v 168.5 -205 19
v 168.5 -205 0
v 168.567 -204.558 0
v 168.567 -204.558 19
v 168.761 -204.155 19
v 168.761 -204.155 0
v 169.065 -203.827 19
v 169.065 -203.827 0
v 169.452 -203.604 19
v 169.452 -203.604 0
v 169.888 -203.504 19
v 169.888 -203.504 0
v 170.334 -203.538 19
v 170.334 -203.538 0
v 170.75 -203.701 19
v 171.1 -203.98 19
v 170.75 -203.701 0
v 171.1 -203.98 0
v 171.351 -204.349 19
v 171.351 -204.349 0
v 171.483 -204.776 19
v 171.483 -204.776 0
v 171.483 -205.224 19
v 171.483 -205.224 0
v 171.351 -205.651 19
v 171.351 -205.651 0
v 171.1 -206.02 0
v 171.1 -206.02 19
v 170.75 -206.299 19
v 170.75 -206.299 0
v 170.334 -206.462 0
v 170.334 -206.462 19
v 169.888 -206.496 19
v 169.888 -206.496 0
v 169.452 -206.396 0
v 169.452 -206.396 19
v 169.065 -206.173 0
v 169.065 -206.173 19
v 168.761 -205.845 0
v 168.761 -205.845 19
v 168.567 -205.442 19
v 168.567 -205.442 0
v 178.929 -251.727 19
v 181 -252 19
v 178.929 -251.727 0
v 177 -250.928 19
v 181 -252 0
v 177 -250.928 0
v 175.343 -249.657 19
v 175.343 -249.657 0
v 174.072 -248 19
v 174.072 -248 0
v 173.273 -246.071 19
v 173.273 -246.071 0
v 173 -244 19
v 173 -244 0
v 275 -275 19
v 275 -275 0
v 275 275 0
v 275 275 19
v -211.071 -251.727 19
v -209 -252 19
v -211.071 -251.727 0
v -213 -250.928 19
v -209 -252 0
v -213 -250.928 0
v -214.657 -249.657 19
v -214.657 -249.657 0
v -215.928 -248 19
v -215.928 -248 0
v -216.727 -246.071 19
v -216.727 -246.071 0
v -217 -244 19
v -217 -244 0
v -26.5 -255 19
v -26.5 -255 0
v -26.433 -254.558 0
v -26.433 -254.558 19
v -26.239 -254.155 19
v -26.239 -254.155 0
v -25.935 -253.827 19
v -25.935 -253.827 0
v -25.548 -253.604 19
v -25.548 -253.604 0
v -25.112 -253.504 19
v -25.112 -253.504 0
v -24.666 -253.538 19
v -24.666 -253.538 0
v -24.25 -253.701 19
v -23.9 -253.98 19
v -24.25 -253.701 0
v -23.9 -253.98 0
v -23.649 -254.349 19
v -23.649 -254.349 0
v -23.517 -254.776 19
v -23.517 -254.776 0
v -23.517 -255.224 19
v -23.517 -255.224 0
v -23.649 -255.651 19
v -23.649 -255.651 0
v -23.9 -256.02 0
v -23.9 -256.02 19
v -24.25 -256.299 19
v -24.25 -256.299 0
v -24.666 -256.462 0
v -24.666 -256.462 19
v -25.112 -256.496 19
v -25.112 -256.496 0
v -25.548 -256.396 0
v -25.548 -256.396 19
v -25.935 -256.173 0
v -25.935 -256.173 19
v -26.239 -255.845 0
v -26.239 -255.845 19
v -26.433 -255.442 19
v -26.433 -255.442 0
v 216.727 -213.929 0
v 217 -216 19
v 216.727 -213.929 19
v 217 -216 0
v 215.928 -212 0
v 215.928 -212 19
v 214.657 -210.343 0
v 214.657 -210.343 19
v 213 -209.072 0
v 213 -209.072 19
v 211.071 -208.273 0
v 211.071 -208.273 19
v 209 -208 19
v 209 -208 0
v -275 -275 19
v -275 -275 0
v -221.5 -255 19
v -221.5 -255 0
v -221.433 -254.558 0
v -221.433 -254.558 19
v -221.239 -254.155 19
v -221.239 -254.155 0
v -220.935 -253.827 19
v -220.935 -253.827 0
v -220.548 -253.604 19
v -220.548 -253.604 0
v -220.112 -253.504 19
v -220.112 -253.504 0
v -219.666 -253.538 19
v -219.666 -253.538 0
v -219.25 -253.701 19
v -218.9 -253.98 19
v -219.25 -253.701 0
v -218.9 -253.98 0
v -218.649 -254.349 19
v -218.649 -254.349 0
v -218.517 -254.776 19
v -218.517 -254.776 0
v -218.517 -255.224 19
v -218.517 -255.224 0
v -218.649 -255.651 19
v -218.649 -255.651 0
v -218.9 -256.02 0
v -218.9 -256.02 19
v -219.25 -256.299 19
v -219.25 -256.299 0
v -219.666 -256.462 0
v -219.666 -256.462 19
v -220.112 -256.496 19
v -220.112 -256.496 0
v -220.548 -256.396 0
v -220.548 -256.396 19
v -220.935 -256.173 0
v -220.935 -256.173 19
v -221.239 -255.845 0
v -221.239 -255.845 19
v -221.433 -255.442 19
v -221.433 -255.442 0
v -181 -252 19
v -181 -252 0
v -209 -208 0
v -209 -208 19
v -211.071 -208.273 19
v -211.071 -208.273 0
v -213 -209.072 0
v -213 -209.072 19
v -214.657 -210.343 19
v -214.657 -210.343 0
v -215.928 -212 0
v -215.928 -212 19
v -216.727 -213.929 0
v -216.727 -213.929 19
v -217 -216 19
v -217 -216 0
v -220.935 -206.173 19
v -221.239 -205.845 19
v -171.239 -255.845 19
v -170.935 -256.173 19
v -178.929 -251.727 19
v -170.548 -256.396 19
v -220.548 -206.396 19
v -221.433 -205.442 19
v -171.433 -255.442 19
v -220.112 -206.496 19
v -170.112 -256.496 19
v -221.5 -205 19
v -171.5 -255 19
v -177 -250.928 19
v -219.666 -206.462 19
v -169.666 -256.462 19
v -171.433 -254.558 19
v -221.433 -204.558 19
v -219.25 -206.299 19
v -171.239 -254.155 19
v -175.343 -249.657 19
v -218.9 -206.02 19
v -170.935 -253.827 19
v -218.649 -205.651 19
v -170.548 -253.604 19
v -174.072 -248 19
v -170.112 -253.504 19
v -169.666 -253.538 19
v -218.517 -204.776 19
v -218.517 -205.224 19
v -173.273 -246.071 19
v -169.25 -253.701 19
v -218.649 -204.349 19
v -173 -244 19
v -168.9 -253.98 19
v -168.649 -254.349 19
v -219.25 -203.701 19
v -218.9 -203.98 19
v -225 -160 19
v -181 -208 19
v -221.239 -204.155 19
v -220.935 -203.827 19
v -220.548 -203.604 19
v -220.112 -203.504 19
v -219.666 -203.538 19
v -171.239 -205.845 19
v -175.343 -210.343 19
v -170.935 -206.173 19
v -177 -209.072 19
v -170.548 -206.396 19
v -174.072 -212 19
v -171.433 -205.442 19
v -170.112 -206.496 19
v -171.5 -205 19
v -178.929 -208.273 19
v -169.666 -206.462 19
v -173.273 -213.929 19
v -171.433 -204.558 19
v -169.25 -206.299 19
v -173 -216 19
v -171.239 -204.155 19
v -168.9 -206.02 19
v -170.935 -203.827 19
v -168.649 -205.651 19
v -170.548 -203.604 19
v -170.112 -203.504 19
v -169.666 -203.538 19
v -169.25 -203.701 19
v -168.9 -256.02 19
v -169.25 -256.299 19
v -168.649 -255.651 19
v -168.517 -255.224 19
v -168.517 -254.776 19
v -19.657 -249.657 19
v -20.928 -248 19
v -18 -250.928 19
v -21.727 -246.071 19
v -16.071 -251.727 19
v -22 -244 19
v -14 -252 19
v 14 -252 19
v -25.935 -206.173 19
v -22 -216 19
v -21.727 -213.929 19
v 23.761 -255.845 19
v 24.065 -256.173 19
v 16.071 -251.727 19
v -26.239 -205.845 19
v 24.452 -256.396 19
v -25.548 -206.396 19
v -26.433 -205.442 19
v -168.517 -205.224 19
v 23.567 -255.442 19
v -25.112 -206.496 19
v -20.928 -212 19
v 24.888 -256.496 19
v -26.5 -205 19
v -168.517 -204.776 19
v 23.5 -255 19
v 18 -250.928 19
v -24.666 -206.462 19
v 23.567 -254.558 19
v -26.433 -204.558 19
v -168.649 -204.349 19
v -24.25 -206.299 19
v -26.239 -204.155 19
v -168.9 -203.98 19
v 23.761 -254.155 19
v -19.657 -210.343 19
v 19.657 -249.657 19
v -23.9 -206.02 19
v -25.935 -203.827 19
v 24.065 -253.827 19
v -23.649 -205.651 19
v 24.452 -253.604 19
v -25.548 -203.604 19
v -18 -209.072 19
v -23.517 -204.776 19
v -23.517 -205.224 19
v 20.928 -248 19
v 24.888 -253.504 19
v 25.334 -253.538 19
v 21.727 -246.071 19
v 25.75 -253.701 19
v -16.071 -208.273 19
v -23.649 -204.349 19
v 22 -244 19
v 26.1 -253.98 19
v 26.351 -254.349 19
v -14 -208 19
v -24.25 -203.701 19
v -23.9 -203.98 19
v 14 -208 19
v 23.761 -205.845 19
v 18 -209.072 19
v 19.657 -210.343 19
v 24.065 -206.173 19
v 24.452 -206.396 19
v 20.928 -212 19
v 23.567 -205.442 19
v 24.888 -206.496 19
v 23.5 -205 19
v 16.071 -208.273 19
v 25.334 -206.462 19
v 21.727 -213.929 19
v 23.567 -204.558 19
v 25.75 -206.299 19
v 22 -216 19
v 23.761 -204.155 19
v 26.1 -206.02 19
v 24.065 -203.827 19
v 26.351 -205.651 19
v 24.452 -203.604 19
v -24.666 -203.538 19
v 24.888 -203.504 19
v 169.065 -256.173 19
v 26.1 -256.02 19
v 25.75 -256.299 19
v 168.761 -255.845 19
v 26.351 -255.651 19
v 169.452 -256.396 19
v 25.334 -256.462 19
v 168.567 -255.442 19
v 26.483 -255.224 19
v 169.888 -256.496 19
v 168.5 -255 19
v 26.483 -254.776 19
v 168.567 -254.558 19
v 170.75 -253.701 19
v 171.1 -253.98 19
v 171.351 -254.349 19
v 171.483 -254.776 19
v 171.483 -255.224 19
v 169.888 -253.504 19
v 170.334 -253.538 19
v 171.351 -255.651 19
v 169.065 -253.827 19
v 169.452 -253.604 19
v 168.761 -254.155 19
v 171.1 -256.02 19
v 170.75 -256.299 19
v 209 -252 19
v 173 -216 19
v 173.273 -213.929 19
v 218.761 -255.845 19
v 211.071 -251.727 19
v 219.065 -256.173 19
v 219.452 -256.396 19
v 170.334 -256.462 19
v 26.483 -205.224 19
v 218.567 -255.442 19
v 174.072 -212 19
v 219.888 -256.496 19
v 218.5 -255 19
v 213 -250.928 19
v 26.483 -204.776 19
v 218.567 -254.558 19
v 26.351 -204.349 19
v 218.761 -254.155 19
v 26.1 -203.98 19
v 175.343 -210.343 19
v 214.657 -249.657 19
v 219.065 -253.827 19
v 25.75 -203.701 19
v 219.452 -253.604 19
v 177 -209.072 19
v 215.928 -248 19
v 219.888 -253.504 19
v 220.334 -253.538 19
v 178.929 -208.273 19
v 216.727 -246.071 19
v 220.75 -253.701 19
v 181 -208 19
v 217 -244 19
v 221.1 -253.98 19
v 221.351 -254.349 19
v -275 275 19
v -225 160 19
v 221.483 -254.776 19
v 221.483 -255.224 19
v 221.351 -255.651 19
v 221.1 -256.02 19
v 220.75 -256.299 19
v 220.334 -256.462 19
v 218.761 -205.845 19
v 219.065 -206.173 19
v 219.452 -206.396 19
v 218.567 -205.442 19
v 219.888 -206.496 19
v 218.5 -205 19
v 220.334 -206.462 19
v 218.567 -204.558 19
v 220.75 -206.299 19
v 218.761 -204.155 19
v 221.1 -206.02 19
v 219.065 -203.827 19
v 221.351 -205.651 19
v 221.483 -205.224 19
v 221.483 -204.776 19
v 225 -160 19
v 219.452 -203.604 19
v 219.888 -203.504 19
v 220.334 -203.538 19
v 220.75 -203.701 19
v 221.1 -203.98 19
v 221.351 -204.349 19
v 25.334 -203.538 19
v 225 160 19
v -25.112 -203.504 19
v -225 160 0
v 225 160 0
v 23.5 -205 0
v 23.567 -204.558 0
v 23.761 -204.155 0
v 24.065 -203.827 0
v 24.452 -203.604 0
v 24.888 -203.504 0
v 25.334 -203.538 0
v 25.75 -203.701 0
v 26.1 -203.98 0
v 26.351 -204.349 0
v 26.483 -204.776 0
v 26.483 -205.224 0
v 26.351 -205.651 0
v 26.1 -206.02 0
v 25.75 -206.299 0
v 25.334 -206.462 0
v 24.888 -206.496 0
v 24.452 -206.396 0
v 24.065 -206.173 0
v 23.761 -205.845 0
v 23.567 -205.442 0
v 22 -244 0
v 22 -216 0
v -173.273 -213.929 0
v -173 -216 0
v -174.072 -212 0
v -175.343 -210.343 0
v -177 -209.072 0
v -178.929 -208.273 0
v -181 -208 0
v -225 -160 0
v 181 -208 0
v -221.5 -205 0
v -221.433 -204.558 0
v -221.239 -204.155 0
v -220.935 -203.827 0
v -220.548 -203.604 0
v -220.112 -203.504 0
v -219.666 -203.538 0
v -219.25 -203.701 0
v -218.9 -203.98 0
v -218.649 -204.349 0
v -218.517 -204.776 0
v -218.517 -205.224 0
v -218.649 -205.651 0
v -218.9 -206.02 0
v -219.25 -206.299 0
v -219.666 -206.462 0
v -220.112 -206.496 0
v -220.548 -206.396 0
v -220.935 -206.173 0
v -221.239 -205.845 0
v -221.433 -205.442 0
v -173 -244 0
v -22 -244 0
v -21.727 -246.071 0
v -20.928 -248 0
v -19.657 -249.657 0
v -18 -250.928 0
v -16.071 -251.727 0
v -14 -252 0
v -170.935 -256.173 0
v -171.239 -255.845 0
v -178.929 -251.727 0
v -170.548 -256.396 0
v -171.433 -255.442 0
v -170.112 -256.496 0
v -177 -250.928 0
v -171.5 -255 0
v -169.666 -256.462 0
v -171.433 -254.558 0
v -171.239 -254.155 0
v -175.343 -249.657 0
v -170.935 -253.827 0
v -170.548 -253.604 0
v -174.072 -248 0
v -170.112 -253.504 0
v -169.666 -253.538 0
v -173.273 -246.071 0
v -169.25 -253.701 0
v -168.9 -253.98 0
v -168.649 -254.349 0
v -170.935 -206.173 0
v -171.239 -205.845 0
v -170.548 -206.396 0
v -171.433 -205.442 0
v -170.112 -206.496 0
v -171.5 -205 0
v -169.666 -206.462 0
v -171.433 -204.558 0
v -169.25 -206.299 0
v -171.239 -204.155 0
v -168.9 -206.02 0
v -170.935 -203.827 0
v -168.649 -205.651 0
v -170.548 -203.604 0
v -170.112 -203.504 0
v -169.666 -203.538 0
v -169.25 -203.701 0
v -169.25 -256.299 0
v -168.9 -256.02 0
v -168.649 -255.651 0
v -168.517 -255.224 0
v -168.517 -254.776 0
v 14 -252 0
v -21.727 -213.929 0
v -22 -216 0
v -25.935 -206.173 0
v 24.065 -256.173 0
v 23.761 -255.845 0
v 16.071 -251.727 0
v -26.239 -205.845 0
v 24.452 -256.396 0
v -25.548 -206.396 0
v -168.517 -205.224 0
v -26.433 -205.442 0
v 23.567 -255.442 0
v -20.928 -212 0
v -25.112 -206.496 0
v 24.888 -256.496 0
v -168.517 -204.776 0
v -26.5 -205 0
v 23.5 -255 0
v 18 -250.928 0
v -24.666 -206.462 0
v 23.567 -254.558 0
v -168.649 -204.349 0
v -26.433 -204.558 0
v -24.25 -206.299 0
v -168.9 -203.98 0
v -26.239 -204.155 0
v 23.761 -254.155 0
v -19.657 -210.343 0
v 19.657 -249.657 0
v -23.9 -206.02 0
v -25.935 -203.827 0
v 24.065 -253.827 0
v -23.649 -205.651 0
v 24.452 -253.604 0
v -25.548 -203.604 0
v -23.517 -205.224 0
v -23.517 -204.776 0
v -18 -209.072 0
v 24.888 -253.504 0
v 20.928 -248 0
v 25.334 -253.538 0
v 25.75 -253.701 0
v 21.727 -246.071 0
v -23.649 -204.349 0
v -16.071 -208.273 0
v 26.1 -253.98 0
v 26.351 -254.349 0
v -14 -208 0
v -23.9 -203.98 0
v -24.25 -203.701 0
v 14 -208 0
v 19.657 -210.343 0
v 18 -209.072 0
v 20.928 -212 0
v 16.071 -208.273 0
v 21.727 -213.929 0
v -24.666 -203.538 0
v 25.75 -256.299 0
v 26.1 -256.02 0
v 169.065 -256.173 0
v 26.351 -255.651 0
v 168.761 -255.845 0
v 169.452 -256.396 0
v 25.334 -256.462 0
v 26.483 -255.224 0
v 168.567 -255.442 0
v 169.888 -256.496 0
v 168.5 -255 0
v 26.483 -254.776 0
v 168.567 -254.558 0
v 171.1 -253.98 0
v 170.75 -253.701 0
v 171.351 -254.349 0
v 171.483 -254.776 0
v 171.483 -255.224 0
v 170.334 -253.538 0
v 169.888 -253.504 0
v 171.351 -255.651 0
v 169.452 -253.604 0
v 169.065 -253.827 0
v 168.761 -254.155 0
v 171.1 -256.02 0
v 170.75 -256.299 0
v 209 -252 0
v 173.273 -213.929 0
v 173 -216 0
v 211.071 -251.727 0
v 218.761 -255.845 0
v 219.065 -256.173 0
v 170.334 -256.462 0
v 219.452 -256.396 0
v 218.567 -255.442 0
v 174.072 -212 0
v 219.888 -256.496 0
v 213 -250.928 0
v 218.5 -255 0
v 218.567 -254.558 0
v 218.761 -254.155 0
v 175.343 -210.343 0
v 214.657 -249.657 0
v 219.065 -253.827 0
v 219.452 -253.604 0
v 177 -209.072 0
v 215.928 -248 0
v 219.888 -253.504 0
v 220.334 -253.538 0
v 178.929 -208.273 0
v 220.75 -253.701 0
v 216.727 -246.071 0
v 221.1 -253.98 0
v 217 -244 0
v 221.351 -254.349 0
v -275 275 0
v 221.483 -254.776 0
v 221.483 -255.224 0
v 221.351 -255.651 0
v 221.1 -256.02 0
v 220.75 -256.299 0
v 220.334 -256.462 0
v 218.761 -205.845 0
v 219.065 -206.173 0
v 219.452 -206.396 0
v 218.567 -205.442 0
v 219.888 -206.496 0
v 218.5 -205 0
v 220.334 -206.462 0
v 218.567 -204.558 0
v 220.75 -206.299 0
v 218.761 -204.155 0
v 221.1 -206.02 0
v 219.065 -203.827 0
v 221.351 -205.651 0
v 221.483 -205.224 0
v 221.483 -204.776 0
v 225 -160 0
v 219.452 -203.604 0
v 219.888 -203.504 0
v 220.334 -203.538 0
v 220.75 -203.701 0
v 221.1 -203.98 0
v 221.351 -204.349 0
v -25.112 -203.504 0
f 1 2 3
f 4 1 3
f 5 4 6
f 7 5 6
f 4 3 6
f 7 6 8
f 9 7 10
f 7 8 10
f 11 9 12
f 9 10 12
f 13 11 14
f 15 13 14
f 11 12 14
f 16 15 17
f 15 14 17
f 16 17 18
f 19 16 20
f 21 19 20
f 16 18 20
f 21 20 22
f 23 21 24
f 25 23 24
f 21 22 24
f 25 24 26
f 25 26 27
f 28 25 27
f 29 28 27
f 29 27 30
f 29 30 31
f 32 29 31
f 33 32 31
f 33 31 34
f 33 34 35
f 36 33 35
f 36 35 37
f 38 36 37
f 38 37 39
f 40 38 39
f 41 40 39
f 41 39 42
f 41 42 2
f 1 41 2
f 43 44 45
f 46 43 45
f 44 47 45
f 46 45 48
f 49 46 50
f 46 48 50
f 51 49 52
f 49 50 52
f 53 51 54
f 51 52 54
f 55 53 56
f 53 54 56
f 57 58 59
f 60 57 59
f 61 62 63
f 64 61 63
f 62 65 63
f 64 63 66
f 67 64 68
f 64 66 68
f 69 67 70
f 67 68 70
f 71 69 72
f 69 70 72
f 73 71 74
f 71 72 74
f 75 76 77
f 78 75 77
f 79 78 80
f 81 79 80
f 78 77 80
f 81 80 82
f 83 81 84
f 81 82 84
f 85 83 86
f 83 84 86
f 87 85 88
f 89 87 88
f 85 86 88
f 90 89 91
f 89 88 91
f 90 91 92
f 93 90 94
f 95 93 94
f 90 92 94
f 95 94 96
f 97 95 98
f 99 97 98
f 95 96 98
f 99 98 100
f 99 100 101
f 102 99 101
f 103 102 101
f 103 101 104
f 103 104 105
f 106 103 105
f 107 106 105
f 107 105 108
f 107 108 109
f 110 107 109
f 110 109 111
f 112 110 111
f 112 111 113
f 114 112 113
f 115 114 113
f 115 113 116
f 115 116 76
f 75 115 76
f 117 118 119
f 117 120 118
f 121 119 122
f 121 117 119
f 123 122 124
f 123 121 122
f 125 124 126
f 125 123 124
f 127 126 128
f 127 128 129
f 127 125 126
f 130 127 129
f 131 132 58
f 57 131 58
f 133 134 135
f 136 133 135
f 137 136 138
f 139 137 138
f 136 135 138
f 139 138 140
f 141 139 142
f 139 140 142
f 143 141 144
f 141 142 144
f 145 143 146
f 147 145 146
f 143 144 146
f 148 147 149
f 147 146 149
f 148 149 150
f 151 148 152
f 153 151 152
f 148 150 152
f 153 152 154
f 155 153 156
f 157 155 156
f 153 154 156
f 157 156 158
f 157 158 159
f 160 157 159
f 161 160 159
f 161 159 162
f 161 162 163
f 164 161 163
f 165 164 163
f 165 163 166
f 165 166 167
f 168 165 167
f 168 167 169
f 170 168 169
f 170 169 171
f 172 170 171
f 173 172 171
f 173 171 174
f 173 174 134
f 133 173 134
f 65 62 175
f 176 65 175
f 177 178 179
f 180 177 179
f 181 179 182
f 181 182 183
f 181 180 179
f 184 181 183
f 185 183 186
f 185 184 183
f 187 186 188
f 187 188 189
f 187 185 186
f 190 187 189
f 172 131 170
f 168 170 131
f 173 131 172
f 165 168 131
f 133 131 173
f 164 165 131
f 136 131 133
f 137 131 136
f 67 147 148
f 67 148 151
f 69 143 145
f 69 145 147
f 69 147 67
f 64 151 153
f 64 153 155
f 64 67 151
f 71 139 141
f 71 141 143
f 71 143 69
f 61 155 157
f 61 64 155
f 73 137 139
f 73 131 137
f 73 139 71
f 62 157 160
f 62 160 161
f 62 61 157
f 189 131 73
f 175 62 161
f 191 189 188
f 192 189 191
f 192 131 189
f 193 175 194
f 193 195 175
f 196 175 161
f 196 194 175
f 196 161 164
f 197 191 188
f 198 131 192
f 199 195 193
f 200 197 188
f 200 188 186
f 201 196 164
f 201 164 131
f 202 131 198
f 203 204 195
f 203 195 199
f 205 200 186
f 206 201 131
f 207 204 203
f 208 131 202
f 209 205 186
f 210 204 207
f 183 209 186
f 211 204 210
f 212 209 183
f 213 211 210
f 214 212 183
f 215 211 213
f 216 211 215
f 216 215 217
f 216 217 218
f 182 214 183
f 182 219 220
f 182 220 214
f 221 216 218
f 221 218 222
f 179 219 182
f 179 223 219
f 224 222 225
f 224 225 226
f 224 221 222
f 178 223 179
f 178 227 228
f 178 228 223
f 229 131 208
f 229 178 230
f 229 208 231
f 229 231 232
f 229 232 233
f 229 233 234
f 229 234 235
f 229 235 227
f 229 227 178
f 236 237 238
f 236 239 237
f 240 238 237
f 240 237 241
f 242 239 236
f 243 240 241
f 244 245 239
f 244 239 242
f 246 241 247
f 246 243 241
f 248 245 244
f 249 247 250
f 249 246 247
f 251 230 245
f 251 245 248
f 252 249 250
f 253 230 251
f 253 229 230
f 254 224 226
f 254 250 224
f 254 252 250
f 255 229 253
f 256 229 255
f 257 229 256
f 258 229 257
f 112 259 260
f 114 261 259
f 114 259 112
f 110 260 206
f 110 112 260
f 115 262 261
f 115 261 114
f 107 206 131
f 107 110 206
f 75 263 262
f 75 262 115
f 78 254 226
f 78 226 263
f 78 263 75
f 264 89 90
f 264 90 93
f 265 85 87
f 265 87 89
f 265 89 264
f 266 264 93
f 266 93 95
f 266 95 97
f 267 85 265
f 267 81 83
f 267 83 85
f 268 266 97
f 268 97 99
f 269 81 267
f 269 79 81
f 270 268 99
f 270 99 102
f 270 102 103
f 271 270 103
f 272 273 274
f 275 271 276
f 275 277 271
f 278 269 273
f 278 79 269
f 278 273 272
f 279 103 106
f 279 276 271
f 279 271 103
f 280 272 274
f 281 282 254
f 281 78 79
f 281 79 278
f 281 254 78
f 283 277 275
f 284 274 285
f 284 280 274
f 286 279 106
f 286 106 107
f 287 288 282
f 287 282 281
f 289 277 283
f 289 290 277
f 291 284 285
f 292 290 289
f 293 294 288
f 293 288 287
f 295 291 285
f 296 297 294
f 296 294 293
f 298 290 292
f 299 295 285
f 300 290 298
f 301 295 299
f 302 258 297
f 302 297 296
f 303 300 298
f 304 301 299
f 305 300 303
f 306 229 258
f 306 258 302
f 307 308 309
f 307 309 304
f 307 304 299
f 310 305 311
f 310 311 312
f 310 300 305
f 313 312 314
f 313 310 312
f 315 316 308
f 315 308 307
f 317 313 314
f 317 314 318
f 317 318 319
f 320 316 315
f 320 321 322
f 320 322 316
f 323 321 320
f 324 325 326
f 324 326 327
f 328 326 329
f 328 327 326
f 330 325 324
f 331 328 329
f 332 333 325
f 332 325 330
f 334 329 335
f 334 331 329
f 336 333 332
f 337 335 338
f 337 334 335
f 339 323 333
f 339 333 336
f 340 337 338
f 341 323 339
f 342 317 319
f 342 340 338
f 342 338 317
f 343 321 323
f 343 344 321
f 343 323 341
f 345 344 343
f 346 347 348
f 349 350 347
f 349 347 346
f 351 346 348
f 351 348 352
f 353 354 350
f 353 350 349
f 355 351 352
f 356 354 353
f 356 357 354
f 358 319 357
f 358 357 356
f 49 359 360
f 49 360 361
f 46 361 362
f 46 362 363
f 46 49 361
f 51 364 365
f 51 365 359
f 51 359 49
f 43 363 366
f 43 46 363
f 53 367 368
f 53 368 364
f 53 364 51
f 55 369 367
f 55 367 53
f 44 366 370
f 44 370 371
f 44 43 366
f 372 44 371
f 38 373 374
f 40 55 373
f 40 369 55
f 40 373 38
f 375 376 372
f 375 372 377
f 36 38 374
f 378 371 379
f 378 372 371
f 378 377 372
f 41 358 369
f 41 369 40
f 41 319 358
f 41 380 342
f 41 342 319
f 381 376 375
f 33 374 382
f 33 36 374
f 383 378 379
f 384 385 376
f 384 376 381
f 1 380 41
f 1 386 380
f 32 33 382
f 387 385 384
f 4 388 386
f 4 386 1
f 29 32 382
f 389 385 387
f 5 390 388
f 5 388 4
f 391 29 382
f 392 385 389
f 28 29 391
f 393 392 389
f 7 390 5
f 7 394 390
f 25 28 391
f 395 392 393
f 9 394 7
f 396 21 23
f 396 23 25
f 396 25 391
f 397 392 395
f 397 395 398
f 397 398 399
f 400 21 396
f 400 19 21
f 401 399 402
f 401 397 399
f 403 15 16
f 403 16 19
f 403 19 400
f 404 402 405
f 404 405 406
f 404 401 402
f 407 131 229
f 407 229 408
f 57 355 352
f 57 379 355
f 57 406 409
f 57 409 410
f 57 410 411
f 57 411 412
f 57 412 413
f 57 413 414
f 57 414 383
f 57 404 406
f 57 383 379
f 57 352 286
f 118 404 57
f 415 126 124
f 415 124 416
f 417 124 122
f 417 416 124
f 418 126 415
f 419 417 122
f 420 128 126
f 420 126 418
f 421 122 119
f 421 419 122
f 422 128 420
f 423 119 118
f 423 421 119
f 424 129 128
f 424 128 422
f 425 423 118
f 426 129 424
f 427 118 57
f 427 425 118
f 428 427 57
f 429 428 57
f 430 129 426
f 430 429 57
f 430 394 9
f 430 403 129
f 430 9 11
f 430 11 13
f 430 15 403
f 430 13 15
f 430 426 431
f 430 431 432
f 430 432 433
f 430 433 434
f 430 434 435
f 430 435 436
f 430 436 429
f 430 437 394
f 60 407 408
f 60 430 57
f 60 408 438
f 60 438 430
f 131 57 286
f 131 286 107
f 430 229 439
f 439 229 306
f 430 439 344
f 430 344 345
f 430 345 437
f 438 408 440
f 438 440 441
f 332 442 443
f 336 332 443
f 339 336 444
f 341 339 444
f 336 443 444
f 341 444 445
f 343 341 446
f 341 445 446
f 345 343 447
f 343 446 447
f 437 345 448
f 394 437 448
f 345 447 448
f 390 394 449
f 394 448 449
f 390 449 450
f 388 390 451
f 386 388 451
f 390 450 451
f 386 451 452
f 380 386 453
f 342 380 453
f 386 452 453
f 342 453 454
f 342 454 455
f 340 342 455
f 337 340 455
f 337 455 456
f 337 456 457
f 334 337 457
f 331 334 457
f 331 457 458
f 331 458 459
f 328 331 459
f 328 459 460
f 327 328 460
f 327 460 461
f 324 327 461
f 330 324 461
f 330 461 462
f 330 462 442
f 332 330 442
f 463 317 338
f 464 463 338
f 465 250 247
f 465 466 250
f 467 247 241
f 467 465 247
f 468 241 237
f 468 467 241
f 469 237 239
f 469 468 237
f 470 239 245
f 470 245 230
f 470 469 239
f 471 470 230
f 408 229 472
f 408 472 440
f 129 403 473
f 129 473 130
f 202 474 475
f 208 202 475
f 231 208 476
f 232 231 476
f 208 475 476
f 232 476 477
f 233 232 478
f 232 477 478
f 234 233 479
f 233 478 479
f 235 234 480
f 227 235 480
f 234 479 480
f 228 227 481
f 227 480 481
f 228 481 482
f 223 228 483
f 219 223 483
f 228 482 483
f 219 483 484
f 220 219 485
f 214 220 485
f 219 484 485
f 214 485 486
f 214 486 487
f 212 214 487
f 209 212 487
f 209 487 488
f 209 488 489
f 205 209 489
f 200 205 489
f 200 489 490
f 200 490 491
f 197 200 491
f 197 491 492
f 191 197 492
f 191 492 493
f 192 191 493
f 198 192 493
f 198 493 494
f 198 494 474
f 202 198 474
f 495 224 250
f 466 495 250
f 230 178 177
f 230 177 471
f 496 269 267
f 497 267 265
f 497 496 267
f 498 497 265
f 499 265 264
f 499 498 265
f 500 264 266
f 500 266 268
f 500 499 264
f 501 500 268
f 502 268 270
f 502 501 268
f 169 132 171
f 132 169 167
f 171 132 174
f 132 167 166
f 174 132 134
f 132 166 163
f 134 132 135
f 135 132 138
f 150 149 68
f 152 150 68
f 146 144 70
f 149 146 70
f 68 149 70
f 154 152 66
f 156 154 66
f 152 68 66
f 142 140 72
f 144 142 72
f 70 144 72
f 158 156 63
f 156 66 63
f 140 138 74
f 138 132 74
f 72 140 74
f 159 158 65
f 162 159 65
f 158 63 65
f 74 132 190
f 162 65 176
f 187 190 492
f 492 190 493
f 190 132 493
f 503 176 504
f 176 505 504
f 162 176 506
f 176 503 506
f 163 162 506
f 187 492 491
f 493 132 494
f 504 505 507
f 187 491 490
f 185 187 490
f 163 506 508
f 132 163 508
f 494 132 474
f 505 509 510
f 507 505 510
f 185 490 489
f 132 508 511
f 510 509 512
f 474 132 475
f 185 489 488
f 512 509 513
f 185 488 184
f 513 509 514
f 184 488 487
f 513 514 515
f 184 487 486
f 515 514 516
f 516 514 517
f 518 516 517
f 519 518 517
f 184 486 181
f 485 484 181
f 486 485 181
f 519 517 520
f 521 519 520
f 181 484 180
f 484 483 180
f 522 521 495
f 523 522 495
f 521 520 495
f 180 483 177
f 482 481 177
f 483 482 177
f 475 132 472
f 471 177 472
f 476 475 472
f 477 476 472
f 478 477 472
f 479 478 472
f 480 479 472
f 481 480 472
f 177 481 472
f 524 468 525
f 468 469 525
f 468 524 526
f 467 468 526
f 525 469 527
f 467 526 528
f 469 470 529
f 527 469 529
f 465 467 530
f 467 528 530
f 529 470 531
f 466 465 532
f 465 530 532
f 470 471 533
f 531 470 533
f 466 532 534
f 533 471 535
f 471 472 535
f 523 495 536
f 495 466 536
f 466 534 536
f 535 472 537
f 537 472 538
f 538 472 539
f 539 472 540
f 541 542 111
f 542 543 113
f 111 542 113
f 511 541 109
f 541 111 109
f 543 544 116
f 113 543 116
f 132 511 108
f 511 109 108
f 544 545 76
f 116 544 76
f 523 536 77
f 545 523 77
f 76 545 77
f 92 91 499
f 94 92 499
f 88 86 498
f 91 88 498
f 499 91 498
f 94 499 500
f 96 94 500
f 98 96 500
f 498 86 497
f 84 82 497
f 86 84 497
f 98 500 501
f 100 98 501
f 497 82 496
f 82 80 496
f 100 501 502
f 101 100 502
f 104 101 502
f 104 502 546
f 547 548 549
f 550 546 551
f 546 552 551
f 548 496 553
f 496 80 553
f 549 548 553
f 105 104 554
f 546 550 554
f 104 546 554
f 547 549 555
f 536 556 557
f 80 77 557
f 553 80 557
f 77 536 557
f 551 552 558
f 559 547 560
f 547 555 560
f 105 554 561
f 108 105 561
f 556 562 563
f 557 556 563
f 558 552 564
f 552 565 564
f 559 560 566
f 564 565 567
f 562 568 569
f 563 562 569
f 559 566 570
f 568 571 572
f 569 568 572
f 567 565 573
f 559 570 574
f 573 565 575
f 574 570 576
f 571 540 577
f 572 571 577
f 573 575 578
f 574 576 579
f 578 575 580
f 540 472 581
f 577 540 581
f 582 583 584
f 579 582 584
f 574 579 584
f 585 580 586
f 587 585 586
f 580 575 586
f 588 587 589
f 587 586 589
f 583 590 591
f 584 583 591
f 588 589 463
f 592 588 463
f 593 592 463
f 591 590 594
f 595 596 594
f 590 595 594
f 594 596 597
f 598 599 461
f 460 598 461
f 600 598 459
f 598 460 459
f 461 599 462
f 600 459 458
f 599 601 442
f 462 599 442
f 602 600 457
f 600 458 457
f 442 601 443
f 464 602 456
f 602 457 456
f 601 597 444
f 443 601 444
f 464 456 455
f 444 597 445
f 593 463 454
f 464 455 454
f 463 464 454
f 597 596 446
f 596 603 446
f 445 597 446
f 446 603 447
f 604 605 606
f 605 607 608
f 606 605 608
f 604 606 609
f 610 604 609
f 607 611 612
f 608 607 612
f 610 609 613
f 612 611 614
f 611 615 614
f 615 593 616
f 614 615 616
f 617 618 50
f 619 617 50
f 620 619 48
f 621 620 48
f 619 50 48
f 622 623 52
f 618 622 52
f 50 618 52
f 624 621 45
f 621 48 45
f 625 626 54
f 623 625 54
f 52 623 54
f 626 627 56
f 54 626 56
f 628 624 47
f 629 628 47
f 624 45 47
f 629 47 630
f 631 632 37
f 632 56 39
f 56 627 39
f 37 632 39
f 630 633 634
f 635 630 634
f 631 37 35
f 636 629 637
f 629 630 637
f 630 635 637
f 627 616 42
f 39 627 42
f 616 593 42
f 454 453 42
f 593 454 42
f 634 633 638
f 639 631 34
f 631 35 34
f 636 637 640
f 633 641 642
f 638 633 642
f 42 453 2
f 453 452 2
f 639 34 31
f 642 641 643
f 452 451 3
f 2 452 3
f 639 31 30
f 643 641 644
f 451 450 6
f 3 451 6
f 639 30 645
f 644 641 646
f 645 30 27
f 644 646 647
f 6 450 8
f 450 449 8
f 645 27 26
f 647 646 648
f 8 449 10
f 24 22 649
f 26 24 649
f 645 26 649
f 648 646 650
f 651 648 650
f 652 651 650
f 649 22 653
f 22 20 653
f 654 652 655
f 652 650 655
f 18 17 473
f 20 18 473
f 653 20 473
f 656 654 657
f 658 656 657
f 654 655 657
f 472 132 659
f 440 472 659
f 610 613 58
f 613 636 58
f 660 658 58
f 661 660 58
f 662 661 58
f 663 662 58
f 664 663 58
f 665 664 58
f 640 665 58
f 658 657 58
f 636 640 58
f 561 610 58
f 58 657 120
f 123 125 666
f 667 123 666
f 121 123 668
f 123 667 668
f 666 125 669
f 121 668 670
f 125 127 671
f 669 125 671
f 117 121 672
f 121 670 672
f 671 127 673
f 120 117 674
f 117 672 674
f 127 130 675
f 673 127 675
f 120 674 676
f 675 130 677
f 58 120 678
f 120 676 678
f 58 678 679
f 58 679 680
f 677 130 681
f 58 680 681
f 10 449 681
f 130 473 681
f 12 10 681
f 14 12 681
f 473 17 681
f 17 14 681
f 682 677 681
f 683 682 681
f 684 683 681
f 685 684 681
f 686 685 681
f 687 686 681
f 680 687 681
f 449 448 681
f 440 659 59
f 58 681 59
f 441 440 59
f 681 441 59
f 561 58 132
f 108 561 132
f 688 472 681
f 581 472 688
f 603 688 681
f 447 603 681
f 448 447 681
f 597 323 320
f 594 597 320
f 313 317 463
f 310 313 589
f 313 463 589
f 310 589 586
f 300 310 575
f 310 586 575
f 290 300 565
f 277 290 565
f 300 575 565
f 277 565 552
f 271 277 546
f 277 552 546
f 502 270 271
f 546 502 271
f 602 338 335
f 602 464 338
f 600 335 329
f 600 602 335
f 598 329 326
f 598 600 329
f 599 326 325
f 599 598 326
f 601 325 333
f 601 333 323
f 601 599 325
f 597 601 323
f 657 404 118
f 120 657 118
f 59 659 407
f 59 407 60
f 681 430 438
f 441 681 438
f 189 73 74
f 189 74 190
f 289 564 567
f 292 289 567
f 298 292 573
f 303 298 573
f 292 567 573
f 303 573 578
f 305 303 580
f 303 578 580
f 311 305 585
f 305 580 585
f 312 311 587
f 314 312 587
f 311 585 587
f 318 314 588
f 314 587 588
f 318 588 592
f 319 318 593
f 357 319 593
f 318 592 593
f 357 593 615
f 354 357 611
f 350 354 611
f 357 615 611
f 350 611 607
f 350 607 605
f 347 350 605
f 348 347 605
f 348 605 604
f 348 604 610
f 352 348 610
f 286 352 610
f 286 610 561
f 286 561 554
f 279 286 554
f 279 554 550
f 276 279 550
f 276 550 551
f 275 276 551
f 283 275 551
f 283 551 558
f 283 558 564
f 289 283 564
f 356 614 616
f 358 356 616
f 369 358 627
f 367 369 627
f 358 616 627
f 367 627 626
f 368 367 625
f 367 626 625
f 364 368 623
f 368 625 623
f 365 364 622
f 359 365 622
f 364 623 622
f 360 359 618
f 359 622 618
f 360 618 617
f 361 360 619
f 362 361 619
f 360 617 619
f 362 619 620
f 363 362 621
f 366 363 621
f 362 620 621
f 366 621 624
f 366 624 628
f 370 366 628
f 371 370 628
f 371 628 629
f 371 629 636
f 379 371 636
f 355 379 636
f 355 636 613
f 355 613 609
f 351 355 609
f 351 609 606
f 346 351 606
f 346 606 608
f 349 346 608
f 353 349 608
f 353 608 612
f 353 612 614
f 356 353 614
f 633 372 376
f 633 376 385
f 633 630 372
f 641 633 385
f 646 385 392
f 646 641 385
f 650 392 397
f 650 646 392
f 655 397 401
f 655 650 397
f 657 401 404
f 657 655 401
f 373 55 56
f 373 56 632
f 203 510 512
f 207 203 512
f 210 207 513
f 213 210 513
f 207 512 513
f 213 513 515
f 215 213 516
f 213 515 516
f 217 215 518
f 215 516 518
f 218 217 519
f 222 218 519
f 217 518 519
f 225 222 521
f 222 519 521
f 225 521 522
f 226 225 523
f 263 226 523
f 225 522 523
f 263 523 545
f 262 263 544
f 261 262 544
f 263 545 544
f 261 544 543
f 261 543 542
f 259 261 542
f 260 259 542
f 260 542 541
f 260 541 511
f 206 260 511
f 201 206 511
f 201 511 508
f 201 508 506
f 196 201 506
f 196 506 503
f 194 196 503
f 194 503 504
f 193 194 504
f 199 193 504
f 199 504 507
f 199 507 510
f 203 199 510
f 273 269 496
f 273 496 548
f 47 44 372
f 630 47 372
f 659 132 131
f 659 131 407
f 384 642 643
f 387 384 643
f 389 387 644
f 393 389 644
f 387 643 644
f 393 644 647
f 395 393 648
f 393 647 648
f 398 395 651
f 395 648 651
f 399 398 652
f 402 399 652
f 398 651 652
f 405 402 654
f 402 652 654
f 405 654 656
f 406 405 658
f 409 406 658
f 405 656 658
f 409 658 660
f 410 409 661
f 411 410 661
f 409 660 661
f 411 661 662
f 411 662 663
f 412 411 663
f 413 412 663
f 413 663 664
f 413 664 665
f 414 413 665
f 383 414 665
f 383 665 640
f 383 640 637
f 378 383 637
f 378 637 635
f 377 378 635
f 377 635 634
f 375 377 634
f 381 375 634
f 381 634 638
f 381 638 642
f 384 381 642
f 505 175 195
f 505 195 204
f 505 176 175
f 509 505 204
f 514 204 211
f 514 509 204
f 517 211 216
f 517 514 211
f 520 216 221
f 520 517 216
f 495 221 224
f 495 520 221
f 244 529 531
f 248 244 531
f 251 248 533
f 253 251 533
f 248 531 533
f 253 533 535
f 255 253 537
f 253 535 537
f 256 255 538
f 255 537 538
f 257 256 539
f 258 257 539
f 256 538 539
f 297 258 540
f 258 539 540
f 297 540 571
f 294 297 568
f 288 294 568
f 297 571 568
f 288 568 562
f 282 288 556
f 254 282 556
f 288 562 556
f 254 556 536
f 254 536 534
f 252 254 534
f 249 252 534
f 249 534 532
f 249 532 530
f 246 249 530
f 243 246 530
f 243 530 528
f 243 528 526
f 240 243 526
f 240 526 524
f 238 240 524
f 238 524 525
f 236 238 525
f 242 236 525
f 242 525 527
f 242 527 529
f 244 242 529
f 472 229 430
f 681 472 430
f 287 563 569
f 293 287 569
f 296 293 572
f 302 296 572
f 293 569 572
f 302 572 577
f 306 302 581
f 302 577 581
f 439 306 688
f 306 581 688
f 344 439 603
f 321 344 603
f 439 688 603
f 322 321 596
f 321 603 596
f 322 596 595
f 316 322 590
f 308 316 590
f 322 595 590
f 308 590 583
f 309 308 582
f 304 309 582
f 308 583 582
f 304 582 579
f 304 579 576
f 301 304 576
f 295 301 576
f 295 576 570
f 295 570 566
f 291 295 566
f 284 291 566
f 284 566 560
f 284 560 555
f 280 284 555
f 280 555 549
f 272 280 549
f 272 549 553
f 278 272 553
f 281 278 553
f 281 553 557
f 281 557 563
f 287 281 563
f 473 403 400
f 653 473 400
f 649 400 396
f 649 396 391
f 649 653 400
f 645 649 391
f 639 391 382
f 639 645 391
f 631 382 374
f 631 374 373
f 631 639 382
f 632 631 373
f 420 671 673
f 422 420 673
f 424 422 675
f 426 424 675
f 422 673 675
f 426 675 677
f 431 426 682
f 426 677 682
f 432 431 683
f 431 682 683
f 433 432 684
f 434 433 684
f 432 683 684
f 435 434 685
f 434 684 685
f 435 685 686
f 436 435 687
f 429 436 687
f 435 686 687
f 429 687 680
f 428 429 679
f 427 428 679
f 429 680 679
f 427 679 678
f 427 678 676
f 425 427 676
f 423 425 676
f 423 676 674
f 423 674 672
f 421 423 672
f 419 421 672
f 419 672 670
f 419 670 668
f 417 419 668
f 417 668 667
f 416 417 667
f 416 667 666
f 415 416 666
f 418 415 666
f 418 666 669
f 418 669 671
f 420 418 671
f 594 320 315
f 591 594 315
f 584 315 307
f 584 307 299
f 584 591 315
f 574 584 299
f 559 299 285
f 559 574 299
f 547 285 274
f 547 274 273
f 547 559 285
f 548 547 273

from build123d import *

# Parameters (mm, degrees)
F0_W     = 550
F0_H     = 550
F1_DEPTH = 19
F2_W     = 450
F2_H     = 320
F3_DEPTH = 25
F5_D     = 3
F4_W     = 44
F4_H     = 44
F4_W_2   = 22
F6_DEPTH = 25
F7_R     = 8


with BuildPart() as f1:
    # F0 (on Top) → F1 (new body)
    with BuildSketch(Plane.XY):
        Rectangle(F0_W, F0_H)
    extrude(amount=F1_DEPTH)

    # F2 (on face) → F3 (cut)
    with BuildSketch(Plane.XY.offset(19)):
        Rectangle(F2_W, F2_H)
    extrude(amount=-F3_DEPTH, mode=Mode.SUBTRACT)

    # F5 (through all)
    with Locations(Plane.XY.offset(19)):
        with Locations((220, -255), (220, -205), (170, -205), (170, -255), (-220, -205), (-220, -255), (-170, -255), (-25, -205), (-25, -255), (25, -255), (25, -205), (-170, -205)):
            Hole(F5_D / 2)

    # F4 (on face) → F6 (cut)
    with BuildSketch(Plane.XY.offset(19)):
        with Locations((195, -230)):
            Rectangle(F4_W, F4_H)
        with Locations((-195, -230)):
            Rectangle(F4_W, F4_H)
        with Locations((11, -230)):
            Rectangle(F4_W_2, F4_H)
        with Locations((-11, -230)):
            Rectangle(F4_W_2, F4_H)
    extrude(amount=-F6_DEPTH, mode=Mode.SUBTRACT)

    # F7
    f7_edges = [f1.edges().sort_by_distance(p)[0] for p in [
        (173, -208, 9.5),
        (217, -208, 9.5),
        (173, -252, 9.5),
        (217, -252, 9.5),
        (-217, -252, 9.5),
        (-217, -208, 9.5),
        (-173, -208, 9.5),
        (-173, -252, 9.5),
        (-22, -252, 9.5),
        (22, -252, 9.5),
        (22, -208, 9.5),
        (-22, -208, 9.5),
    ]]
    fillet(f7_edges, radius=F7_R)


solid = f1.part
